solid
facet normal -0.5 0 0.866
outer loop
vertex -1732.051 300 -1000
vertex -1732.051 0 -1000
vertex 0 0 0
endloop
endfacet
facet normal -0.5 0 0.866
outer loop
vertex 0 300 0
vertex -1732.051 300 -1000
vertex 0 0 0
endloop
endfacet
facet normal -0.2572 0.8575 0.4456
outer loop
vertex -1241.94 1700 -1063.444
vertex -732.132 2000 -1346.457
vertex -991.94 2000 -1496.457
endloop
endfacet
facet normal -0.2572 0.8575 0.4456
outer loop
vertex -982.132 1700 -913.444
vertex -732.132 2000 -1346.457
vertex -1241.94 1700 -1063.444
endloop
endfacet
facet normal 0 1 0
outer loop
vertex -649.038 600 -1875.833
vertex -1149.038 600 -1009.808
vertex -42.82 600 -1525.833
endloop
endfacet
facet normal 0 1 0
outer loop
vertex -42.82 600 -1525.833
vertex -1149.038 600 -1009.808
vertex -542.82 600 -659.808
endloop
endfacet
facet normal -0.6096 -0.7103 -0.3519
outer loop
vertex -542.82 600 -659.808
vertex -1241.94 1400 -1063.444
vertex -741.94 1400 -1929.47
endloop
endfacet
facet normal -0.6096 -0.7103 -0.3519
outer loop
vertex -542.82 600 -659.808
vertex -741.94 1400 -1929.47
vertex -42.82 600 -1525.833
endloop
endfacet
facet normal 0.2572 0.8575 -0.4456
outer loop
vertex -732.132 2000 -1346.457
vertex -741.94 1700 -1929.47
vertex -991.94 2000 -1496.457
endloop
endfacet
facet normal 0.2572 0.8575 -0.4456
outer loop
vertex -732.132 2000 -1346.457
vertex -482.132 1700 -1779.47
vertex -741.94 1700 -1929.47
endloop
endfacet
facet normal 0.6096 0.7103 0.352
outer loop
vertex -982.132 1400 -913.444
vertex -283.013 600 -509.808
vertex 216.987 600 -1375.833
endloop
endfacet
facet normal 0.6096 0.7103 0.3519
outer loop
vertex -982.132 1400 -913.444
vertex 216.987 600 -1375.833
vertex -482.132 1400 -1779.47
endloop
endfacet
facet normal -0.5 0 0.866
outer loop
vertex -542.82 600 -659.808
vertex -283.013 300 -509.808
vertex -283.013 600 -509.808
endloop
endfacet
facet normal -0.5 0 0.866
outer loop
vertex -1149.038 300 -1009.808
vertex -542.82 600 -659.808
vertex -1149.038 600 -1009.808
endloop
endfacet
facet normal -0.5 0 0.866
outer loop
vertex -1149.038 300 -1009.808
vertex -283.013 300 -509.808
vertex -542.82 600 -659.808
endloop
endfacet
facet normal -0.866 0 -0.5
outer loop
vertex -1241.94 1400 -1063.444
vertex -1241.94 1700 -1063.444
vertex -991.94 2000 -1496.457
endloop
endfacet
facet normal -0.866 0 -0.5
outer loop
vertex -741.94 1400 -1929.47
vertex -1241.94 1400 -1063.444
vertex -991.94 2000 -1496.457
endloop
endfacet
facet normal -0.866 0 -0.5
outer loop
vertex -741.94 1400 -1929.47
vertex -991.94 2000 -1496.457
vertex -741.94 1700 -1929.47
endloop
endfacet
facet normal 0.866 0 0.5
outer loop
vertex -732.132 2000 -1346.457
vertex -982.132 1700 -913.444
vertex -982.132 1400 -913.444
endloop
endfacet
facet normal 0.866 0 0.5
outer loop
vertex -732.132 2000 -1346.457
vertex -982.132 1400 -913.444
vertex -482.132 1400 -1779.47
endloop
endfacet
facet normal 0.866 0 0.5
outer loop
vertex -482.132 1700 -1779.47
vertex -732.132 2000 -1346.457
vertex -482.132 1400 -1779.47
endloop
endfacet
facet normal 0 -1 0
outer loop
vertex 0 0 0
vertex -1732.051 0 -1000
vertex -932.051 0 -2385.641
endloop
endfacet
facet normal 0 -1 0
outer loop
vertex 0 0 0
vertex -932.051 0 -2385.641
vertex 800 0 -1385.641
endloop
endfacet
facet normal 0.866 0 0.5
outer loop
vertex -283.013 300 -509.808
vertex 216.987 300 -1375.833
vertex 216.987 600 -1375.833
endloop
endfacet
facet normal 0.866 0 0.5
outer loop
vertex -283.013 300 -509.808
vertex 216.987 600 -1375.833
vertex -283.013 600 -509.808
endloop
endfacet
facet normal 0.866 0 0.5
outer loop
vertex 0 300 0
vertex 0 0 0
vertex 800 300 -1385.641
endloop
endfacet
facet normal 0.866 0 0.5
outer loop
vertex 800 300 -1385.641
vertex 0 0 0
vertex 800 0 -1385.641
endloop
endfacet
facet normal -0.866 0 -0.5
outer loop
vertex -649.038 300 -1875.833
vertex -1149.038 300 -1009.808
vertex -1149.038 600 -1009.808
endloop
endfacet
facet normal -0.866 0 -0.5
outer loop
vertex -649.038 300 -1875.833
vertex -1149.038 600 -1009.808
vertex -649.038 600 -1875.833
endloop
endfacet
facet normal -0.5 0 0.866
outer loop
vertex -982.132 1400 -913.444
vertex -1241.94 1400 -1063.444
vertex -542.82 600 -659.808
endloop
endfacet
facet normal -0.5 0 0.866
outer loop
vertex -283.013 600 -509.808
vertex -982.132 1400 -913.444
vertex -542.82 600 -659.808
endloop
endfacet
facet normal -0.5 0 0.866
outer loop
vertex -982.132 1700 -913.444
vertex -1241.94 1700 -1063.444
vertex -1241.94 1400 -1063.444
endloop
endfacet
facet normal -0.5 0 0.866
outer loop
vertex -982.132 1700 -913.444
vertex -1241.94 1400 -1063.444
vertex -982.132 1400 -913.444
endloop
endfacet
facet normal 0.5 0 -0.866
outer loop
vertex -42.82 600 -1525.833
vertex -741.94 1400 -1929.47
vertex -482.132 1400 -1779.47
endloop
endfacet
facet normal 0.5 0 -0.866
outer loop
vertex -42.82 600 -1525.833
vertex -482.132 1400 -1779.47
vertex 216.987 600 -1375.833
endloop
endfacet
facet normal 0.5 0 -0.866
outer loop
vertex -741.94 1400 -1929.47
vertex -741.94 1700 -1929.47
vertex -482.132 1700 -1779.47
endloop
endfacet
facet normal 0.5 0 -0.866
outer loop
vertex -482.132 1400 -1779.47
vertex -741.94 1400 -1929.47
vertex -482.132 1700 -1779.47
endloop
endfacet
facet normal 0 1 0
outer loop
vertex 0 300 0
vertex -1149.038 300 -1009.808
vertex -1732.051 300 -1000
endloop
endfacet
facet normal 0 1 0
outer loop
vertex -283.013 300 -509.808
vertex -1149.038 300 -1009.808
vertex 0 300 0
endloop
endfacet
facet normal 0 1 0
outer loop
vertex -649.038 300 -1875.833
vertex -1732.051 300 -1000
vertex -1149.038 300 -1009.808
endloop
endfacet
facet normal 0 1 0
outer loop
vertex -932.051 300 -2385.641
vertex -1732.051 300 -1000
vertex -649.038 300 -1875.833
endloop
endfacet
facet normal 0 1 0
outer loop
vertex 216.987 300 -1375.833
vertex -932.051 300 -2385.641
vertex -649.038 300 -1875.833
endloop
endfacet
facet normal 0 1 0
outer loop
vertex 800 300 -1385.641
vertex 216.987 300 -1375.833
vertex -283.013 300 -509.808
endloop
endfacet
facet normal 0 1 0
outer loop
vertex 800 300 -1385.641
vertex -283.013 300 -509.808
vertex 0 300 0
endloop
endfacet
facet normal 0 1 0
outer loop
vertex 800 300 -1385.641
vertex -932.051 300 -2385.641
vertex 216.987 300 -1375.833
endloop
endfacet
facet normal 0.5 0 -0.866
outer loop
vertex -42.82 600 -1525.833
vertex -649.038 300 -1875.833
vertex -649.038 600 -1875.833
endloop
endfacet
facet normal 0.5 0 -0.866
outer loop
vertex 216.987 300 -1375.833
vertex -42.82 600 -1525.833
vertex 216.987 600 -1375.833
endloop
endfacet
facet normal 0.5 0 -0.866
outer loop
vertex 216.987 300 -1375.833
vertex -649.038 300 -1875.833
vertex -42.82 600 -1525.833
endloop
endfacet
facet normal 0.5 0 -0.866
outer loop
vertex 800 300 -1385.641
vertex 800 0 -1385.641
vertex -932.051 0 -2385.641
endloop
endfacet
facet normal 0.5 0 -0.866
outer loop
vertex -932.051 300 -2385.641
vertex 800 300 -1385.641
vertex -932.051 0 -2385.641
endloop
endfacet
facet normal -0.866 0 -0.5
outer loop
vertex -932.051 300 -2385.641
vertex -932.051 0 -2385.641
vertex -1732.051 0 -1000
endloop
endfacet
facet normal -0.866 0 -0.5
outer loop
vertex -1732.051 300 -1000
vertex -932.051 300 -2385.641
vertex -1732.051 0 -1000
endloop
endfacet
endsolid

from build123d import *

# Parameters (mm, degrees)
EXTRUDE1_DEPTH = 300
EXTRUDE2_DEPTH = 300
EXTRUDE3_DEPTH = 1000
EXTRUDE4_DEPTH = 300


with BuildPart() as part:
    # Sketch1 → Extrude1 (new body)
    with BuildSketch(Plane(origin=(0, 0, 0), x_dir=(1, 0, 0), z_dir=(0, 1, 0))):
        Polygon((0, 0), (800, 1385.640646055), (-932.050807569, 2385.640646055), (-1732.050807569, 1000), align=None)
    extrude(amount=EXTRUDE1_DEPTH)

    # Sketch2 → Extrude2 (add)
    with BuildSketch(Plane(origin=(0, 300, 0), x_dir=(-1, 0, 0), z_dir=(0, 1, 0))):
        Polygon((649.038105677, -1875.83302492), (-216.987298108, -1375.83302492), (283.012701892, -509.807621135), (1149.038105677, -1009.807621135), align=None)
    extrude(amount=EXTRUDE2_DEPTH)

    # Sketch3 → Extrude3 (add)
    with BuildSketch(Plane(origin=(150, 0, -259.807621135), x_dir=(0.866025404, 0, 0.5), z_dir=(-0.5, 0, 0.866025404))):
        Polygon((-500, 600), (-1307.273555505, 1400), (-1307.273555505, 1700), (-1607.273555505, 1700), (-1607.273555505, 1400), (-800, 600), align=None)
    extrude(amount=-EXTRUDE3_DEPTH)

    # Sketch4 → Extrude4 (add)
    with BuildSketch(Plane(origin=(-1132.132108763, 0, -653.636777752), x_dir=(0.5, 0, -0.866025404), z_dir=(0.866025404, 0, 0.5))):
        Polygon((300, 1700), (1300, 1700), (800, 2000), align=None)
    extrude(amount=-EXTRUDE4_DEPTH)


solid = part.part
